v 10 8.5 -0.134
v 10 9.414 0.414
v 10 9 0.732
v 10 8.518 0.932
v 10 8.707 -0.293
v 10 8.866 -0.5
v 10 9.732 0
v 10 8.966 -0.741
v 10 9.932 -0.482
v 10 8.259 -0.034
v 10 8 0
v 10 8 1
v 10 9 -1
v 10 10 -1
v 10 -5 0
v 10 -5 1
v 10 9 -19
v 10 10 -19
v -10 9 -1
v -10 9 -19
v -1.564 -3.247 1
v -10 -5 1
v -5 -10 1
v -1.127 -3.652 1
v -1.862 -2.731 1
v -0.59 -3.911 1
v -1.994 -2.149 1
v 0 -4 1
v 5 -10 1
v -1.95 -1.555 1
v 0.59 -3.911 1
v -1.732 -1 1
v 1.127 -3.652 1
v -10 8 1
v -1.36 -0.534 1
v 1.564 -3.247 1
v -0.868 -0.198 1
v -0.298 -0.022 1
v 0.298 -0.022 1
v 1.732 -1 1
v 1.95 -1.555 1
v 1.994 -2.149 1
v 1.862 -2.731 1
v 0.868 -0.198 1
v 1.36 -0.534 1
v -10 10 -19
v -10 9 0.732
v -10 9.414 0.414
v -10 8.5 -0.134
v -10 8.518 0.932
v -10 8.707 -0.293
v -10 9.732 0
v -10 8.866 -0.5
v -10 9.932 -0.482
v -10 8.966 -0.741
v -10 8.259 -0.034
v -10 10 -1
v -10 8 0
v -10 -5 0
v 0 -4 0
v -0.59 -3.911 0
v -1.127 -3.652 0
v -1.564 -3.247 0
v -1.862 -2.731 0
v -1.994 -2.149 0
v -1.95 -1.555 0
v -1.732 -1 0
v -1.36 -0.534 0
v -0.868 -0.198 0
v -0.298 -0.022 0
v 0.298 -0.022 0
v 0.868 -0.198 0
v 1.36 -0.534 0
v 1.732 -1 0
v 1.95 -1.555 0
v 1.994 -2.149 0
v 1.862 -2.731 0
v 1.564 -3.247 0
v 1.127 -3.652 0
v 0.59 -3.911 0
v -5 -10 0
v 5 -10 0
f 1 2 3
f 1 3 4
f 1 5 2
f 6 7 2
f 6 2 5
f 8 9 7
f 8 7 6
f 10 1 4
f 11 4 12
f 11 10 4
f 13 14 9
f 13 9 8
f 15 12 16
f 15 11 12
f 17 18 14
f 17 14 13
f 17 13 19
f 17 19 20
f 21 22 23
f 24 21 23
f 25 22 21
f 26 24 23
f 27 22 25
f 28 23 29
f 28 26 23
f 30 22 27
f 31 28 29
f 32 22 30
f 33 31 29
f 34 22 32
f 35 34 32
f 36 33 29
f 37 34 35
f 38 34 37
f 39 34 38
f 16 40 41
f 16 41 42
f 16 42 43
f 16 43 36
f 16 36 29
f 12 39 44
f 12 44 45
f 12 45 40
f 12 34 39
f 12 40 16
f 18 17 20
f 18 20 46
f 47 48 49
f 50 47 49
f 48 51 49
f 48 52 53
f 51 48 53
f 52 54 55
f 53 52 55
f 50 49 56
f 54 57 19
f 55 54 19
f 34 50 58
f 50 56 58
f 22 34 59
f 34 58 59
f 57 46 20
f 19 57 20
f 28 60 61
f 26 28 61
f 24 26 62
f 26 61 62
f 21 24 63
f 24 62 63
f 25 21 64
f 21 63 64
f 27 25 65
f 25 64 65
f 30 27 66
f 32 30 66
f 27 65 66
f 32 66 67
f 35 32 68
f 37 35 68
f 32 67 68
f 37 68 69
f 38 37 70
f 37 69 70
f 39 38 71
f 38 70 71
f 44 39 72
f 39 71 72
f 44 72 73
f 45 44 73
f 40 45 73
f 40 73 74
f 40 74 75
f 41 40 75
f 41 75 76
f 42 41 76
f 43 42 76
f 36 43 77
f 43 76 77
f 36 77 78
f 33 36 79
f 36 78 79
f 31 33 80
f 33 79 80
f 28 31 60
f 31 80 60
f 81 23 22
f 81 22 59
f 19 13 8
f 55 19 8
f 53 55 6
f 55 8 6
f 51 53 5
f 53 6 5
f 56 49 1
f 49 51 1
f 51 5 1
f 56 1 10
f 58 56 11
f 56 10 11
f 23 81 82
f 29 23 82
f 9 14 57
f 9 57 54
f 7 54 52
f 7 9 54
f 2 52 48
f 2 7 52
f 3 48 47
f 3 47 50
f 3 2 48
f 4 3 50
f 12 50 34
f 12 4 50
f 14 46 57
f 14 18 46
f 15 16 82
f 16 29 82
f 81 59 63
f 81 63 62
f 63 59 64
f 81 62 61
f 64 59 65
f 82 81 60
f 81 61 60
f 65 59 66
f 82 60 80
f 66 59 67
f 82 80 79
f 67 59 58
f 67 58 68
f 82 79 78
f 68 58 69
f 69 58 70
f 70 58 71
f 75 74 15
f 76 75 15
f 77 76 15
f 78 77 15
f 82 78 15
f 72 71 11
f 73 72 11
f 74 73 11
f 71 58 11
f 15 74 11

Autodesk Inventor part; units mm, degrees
ref_plane "YZ Plane" through (0, 0, 0) normal (1, 0, 0) x (0, 1, 0)
ref_plane "XZ Plane" through (0, 0, 0) normal (0, 1, 0) x (-1, 0, 0)
ref_plane "XY Plane" through (0, 0, 0) normal (0, 0, 1) x (1, 0, 0)
sketch "Sketch1" plane through (0, 0, 0) normal (0, 0, 1) x (1, 0, 0)
  line L0 (-10, -10) -> (10, -10)
  line L1 (10, -10) -> (10, 10)
  line L2 (10, 10) -> (-10, 10)
  line L3 (-10, 10) -> (-10, -10)
  line L4 (-10, -10) -> (10, 10) construction
  line L5 (10, -10) -> (-10, 10) construction
  point P0 (0, 0)
  dimension "d0" = 20
  dimension "d1" = 20
extrude "Plate1" add sketch "Sketch1" along normal blind 1
sketch "Sketch2" plane through (10, 9, 1) normal (0, 1, 0) x (-1, 0, 0)
  line L0 (20, 0) -> (0, 0)
  line L1 (0, 0) -> (0, -20)
  line L2 (0, -20) -> (20, -20)
  line L3 (20, -20) -> (20, 0)
edge flange "Flange1" height 20 angle 90 thickness 1 bend radius 1 thickness toward (0, 1, 0) relief tear relief width 1 relief depth 0.5 edges at (0, 10, 0) wall of the first edge with corners at (-10, 9, 1) (10, 9, 1) (10, 9, -19) (-10, 9, -19)
bend "Bend1"
corner "Corner1"
sketch "Sketch3" plane through (0, 0, 1) normal (0, 0, 1) x (1, 0, 0)
  line L0 (5, -10) -> (-5, -10) projected
  point P0 (0, -2)
  point P1 (0, -2)
  point P2 (10, -10)
  point P3 (-10, -10)
  point P4 (0, -10)
  dimension "d23" = 8
chamfer "Corner Chamfer1" distance 5 angle 45 2 edges at (10, -10, 0.5) (-10, -10, 0.5)
hole "Hole1" at (0, -2, 1) direction (0, 0, -1) diameter 4 depth 1 tip angle 118
equation "\"d21\" = Thickness"
equation "\"d3\" = BendReliefWidth"
equation "\"d4\" = BendReliefDepth"
equation "\"d5\" = MinimumRemnant"
equation "\"d6\" = BendRadius"
equation "\"d9\" = BendRadius"
equation "\"d10\" = CornerReliefSize"
equation "\"d11\" = GapSize"
equation "\"d12\" = JacobiRadiusSize"
equation "\"BendRadius\" = Thickness"
equation "\"BendReliefWidth\" = Thickness"
equation "\"BendReliefDepth\" = 0.5 * Thickness"
equation "\"CornerReliefSize\" = 4 * Thickness"
equation "\"MinimumRemnant\" = 2 * Thickness"
equation "\"TransitionRadius\" = BendRadius"
equation "\"JacobiRadiusSize\" = BendRadius"
equation "\"GapSize\" = Thickness"
equation "\"d2\" = BendRadius"
equation "\"Thickness\" = 1"
